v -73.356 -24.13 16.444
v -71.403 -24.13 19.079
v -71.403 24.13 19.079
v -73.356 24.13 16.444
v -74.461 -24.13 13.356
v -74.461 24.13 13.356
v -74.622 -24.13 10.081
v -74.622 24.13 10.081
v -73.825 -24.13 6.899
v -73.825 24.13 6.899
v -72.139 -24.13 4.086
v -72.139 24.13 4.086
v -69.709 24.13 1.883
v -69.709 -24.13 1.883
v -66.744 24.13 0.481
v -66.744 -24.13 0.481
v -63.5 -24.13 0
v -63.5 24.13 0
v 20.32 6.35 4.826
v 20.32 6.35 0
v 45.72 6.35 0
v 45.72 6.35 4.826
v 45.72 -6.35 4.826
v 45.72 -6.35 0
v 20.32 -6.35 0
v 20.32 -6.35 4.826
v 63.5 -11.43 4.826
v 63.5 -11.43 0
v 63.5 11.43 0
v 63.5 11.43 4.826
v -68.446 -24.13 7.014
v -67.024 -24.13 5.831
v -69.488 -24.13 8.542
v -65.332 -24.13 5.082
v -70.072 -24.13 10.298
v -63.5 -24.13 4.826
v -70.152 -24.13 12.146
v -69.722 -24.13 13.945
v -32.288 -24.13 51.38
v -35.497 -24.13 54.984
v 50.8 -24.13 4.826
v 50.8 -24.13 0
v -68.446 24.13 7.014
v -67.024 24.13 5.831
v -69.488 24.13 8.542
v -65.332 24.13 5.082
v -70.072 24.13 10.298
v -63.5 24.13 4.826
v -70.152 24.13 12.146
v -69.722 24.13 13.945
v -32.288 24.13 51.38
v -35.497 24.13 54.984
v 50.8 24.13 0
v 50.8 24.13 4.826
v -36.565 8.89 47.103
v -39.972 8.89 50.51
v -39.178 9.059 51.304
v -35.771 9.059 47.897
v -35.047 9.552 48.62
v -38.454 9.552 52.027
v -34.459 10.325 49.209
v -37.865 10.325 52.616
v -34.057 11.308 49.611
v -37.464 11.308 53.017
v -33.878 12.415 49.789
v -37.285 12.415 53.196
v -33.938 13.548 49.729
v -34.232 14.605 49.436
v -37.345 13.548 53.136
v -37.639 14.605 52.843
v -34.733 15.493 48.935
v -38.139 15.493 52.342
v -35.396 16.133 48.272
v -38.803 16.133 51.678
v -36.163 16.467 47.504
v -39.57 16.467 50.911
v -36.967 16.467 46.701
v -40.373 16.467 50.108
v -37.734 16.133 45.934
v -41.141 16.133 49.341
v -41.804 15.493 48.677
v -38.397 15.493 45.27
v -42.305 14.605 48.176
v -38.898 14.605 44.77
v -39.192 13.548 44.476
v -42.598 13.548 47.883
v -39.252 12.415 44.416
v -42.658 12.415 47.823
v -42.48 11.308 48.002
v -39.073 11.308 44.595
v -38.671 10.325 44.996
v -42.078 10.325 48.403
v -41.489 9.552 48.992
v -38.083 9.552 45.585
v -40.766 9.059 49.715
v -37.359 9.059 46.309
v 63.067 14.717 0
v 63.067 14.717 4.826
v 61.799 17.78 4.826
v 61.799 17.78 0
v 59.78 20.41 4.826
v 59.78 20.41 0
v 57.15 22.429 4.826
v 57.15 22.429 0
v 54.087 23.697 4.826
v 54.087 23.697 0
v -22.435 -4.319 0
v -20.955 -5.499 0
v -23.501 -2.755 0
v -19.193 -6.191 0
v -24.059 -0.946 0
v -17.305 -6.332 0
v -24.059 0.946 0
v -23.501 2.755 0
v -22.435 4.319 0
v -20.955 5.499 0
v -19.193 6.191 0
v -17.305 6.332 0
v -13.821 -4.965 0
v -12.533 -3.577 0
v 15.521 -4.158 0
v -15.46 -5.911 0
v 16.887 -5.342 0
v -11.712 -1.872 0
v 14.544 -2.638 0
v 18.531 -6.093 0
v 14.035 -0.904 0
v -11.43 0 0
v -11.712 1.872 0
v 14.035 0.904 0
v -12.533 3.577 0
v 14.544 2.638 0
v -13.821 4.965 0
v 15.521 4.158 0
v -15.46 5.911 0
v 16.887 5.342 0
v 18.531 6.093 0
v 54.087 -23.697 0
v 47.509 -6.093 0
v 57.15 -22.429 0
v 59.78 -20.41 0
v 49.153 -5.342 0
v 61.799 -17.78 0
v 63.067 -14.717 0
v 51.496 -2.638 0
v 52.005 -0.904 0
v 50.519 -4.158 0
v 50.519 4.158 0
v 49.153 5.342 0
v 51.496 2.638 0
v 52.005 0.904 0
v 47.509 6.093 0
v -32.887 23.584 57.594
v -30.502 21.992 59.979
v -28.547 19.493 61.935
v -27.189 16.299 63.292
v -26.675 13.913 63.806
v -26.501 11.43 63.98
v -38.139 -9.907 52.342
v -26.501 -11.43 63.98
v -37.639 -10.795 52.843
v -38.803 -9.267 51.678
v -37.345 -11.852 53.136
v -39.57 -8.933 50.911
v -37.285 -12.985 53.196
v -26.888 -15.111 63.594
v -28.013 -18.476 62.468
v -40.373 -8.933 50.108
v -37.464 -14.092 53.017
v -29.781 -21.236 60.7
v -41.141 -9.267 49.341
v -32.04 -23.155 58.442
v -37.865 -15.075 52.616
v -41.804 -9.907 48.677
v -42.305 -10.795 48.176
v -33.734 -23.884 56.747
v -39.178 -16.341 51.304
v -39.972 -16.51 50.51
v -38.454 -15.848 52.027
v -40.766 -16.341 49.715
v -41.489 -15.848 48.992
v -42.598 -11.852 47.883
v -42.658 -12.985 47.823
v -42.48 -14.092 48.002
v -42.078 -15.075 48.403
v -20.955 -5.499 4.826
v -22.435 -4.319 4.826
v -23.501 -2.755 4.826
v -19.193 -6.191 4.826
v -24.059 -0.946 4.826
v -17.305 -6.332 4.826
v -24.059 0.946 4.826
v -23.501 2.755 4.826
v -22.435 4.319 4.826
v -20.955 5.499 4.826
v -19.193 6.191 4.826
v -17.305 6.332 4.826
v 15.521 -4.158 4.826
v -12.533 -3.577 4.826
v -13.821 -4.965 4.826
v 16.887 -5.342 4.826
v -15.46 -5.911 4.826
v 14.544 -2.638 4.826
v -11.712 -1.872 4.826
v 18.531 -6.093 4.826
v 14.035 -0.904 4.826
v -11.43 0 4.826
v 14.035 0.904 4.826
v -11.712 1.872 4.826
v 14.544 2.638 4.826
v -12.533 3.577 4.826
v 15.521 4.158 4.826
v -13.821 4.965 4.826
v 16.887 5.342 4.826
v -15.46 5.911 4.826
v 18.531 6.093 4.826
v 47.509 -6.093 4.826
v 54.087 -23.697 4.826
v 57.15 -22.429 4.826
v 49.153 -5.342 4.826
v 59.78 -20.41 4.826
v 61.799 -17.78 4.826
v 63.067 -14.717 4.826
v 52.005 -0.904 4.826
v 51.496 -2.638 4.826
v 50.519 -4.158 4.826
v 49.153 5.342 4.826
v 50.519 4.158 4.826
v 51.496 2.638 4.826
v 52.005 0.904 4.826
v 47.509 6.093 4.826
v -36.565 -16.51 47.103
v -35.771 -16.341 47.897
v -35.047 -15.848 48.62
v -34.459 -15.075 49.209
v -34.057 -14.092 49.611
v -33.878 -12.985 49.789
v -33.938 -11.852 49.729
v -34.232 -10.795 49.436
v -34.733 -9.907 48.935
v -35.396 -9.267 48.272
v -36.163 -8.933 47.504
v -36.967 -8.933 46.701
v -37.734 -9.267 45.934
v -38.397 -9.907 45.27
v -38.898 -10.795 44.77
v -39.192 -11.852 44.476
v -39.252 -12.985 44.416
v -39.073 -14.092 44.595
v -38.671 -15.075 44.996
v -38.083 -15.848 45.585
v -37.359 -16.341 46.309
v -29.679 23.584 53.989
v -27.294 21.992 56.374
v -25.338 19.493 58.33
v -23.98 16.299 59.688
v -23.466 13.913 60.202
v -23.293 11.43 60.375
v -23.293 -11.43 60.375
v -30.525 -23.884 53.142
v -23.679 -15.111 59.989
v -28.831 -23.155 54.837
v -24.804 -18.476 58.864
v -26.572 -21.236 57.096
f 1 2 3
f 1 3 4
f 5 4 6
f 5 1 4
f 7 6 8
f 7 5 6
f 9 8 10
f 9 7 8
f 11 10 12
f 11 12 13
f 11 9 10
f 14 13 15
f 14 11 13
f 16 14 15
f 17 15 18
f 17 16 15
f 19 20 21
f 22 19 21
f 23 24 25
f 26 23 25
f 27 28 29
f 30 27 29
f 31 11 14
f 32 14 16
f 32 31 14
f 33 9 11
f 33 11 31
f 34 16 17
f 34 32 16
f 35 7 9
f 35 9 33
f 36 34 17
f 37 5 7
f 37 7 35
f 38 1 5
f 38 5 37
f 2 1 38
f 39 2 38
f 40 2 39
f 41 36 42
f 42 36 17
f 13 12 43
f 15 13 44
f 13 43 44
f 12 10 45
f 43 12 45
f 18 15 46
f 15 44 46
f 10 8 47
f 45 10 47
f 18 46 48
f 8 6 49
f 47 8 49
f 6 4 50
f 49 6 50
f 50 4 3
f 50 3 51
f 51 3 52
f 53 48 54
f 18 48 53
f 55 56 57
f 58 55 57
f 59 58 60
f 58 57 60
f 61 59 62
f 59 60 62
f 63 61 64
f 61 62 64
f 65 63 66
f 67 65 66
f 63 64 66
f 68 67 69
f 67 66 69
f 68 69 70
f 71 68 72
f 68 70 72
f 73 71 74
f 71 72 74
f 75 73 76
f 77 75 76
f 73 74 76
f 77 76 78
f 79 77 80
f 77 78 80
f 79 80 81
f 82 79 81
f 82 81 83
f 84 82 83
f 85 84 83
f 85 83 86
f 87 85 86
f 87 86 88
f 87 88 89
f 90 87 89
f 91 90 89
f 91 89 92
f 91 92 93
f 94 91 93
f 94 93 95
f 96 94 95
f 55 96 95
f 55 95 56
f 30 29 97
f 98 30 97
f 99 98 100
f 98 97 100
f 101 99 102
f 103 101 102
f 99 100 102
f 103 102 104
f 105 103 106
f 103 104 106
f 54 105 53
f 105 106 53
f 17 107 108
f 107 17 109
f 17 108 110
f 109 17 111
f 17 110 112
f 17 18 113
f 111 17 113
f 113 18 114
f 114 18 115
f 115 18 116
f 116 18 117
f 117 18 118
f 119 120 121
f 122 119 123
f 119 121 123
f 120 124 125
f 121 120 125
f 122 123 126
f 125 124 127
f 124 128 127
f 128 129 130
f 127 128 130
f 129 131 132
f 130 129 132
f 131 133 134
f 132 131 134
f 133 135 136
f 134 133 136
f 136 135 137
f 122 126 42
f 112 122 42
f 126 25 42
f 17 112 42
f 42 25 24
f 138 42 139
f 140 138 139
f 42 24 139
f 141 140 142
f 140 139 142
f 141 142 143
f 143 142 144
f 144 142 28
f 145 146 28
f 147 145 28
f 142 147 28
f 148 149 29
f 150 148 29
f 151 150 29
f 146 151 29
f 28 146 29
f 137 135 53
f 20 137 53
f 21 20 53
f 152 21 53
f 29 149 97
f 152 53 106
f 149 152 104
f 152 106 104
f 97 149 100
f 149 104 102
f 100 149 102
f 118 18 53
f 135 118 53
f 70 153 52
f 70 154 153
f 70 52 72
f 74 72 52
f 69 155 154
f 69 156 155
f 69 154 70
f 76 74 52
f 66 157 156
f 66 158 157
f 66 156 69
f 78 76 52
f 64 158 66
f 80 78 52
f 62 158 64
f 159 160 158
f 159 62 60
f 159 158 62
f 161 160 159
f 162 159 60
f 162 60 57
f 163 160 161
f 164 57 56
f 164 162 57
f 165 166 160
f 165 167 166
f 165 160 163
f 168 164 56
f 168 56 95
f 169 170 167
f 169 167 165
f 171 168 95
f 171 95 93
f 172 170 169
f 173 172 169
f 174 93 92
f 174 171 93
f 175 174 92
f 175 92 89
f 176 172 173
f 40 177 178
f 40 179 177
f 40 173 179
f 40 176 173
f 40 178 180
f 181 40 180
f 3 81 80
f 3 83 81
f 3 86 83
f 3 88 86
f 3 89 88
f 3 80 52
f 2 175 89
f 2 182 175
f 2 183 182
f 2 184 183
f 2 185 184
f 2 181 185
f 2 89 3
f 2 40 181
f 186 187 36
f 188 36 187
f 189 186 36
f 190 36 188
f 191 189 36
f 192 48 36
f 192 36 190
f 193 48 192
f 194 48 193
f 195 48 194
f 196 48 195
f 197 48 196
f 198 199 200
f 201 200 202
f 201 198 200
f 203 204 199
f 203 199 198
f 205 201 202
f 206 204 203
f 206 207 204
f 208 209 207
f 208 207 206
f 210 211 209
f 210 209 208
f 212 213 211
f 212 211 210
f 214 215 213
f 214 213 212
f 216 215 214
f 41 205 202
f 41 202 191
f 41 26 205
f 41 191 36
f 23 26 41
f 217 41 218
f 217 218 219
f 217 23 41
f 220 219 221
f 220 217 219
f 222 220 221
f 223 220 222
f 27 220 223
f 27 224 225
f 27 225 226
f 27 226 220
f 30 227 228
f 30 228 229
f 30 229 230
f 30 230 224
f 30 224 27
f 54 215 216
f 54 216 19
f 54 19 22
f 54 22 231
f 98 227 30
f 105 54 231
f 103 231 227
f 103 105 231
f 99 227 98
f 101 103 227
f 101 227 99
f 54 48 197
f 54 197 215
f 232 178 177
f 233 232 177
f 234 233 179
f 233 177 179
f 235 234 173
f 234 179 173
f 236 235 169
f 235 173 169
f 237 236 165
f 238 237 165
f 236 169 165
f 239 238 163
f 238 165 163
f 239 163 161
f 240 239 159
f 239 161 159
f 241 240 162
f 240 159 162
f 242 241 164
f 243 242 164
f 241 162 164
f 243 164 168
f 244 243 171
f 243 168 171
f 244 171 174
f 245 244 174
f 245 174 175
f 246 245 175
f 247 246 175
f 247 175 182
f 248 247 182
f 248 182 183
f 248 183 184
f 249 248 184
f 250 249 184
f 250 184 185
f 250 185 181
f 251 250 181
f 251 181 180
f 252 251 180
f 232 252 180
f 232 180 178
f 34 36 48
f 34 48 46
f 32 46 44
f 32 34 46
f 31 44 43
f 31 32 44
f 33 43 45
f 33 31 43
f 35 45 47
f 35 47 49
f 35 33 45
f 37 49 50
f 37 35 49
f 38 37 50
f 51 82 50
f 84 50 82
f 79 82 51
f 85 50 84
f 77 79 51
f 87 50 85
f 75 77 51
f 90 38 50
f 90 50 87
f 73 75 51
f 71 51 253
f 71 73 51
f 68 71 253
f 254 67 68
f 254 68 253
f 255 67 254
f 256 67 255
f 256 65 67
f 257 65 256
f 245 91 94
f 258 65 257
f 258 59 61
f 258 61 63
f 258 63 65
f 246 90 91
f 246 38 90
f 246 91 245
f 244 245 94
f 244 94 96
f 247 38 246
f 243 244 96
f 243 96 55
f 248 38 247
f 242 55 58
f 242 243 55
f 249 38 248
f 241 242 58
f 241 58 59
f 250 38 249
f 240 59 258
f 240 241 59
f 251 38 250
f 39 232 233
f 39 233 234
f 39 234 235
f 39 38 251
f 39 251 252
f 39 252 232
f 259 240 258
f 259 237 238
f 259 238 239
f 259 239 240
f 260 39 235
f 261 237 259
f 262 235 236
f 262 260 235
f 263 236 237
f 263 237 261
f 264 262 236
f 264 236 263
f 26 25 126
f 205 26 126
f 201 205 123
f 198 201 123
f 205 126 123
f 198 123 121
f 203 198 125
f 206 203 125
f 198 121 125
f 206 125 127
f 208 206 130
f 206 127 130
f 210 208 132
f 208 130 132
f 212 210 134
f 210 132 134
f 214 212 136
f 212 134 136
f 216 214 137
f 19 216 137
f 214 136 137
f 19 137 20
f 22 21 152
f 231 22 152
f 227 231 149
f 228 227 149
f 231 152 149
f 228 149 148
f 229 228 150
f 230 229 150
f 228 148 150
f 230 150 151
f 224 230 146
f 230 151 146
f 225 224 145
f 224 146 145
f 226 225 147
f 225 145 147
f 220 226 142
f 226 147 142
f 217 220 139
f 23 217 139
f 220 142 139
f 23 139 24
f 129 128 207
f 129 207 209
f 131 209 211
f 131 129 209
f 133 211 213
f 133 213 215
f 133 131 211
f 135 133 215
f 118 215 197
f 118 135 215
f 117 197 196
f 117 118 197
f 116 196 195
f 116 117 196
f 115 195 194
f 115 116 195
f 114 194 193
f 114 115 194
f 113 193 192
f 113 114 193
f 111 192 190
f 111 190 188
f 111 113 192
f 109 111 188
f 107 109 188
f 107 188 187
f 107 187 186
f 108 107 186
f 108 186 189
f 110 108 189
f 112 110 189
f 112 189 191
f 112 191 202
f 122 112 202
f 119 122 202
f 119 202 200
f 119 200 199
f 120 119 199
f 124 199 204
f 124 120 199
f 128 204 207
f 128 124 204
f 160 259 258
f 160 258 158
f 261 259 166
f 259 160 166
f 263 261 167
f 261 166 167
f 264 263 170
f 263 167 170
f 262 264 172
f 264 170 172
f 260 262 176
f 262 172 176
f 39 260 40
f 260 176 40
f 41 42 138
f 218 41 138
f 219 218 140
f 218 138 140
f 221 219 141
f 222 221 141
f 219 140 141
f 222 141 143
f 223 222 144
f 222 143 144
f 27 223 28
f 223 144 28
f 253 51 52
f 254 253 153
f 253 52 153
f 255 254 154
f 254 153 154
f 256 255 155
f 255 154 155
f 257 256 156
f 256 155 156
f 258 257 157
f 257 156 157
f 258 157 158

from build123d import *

# Parameters (mm, degrees)
F0_R     = 6.35
F1_DEPTH = 4.826
F3_DEPTH = 24.13
F4_R     = 12.7
F5_R     = 12.7
F6_R     = 3.81
F7_DEPTH = 25.4


with BuildPart() as f1:
    # F0 (on Top) → F1 (new body)
    with BuildSketch(Plane.XY):
        with BuildLine():
            ThreePointArc((63.5, 11.43), (59.7802561211, 20.4102561211), (50.8, 24.13))
            Line((50.8, 24.13), (-63.5, 24.13))
            Line((-63.5, 24.13), (-63.5, -24.13))
            Line((-63.5, -24.13), (50.8, -24.13))
            ThreePointArc((50.8, -24.13), (59.7802561211, -20.4102561211), (63.5, -11.43))
            Line((63.5, -11.43), (63.5, 11.43))
        make_face()
        with Locations((-17.78, 0)):
            Circle(F0_R, mode=Mode.SUBTRACT)
        with BuildLine():
            Line((20.32, 6.35), (45.72, 6.35))
            ThreePointArc((45.72, 6.35), (52.07, 0), (45.72, -6.35))
            Line((45.72, -6.35), (20.32, -6.35))
            ThreePointArc((20.32, -6.35), (13.97, 0), (20.32, 6.35))
        make_face(mode=Mode.SUBTRACT)
    extrude(amount=F1_DEPTH)

    # F2 (on Front) → F3 (join, symmetric)
    with BuildSketch(Plane.XZ):
        with BuildLine():
            Line((-26.5013447812, 63.9799059919), (-71.4026253865, 19.0786253865))
            ThreePointArc((-71.4026253865, 19.0786253865), (-73.8252776553, 6.8991299599), (-63.5, 0))
            Line((-63.5, 0), (-63.5, 4.826))
            ThreePointArc((-63.5, 4.826), (-69.0200017902, 7.7421508405), (-69.7222982113, 13.9454673105))
            Line((-69.7222982113, 13.9454673105), (-23.2926998145, 60.3750657073))
            Line((-23.2926998145, 60.3750657073), (-26.5013447812, 63.9799059919))
        make_face()
    extrude(amount=F3_DEPTH, both=True)

    # F4
    f4_edges = [f1.edges().sort_by_distance(p)[0] for p in [
        (-24.897022, 24.13, 62.177486),
    ]]
    fillet(f4_edges, radius=F4_R)

    # F5
    f5_edges = [f1.edges().sort_by_distance(p)[0] for p in [
        (-24.897022, -24.13, 62.177486),
    ]]
    fillet(f5_edges, radius=F5_R)

    # F6 (on face) → F7 (cut)
    with BuildSketch(Plane(origin=(-45.2406253865, 0, 45.2406253865), x_dir=(0, -1, 0), z_dir=(-0.7071067812, 0, 0.7071067812))):
        with Locations((-12.7, 7.4513447812)):
            Circle(F6_R)
        with Locations((12.7, 7.4513447812)):
            Circle(F6_R)
    extrude(amount=-F7_DEPTH, mode=Mode.SUBTRACT)


solid = f1.part
